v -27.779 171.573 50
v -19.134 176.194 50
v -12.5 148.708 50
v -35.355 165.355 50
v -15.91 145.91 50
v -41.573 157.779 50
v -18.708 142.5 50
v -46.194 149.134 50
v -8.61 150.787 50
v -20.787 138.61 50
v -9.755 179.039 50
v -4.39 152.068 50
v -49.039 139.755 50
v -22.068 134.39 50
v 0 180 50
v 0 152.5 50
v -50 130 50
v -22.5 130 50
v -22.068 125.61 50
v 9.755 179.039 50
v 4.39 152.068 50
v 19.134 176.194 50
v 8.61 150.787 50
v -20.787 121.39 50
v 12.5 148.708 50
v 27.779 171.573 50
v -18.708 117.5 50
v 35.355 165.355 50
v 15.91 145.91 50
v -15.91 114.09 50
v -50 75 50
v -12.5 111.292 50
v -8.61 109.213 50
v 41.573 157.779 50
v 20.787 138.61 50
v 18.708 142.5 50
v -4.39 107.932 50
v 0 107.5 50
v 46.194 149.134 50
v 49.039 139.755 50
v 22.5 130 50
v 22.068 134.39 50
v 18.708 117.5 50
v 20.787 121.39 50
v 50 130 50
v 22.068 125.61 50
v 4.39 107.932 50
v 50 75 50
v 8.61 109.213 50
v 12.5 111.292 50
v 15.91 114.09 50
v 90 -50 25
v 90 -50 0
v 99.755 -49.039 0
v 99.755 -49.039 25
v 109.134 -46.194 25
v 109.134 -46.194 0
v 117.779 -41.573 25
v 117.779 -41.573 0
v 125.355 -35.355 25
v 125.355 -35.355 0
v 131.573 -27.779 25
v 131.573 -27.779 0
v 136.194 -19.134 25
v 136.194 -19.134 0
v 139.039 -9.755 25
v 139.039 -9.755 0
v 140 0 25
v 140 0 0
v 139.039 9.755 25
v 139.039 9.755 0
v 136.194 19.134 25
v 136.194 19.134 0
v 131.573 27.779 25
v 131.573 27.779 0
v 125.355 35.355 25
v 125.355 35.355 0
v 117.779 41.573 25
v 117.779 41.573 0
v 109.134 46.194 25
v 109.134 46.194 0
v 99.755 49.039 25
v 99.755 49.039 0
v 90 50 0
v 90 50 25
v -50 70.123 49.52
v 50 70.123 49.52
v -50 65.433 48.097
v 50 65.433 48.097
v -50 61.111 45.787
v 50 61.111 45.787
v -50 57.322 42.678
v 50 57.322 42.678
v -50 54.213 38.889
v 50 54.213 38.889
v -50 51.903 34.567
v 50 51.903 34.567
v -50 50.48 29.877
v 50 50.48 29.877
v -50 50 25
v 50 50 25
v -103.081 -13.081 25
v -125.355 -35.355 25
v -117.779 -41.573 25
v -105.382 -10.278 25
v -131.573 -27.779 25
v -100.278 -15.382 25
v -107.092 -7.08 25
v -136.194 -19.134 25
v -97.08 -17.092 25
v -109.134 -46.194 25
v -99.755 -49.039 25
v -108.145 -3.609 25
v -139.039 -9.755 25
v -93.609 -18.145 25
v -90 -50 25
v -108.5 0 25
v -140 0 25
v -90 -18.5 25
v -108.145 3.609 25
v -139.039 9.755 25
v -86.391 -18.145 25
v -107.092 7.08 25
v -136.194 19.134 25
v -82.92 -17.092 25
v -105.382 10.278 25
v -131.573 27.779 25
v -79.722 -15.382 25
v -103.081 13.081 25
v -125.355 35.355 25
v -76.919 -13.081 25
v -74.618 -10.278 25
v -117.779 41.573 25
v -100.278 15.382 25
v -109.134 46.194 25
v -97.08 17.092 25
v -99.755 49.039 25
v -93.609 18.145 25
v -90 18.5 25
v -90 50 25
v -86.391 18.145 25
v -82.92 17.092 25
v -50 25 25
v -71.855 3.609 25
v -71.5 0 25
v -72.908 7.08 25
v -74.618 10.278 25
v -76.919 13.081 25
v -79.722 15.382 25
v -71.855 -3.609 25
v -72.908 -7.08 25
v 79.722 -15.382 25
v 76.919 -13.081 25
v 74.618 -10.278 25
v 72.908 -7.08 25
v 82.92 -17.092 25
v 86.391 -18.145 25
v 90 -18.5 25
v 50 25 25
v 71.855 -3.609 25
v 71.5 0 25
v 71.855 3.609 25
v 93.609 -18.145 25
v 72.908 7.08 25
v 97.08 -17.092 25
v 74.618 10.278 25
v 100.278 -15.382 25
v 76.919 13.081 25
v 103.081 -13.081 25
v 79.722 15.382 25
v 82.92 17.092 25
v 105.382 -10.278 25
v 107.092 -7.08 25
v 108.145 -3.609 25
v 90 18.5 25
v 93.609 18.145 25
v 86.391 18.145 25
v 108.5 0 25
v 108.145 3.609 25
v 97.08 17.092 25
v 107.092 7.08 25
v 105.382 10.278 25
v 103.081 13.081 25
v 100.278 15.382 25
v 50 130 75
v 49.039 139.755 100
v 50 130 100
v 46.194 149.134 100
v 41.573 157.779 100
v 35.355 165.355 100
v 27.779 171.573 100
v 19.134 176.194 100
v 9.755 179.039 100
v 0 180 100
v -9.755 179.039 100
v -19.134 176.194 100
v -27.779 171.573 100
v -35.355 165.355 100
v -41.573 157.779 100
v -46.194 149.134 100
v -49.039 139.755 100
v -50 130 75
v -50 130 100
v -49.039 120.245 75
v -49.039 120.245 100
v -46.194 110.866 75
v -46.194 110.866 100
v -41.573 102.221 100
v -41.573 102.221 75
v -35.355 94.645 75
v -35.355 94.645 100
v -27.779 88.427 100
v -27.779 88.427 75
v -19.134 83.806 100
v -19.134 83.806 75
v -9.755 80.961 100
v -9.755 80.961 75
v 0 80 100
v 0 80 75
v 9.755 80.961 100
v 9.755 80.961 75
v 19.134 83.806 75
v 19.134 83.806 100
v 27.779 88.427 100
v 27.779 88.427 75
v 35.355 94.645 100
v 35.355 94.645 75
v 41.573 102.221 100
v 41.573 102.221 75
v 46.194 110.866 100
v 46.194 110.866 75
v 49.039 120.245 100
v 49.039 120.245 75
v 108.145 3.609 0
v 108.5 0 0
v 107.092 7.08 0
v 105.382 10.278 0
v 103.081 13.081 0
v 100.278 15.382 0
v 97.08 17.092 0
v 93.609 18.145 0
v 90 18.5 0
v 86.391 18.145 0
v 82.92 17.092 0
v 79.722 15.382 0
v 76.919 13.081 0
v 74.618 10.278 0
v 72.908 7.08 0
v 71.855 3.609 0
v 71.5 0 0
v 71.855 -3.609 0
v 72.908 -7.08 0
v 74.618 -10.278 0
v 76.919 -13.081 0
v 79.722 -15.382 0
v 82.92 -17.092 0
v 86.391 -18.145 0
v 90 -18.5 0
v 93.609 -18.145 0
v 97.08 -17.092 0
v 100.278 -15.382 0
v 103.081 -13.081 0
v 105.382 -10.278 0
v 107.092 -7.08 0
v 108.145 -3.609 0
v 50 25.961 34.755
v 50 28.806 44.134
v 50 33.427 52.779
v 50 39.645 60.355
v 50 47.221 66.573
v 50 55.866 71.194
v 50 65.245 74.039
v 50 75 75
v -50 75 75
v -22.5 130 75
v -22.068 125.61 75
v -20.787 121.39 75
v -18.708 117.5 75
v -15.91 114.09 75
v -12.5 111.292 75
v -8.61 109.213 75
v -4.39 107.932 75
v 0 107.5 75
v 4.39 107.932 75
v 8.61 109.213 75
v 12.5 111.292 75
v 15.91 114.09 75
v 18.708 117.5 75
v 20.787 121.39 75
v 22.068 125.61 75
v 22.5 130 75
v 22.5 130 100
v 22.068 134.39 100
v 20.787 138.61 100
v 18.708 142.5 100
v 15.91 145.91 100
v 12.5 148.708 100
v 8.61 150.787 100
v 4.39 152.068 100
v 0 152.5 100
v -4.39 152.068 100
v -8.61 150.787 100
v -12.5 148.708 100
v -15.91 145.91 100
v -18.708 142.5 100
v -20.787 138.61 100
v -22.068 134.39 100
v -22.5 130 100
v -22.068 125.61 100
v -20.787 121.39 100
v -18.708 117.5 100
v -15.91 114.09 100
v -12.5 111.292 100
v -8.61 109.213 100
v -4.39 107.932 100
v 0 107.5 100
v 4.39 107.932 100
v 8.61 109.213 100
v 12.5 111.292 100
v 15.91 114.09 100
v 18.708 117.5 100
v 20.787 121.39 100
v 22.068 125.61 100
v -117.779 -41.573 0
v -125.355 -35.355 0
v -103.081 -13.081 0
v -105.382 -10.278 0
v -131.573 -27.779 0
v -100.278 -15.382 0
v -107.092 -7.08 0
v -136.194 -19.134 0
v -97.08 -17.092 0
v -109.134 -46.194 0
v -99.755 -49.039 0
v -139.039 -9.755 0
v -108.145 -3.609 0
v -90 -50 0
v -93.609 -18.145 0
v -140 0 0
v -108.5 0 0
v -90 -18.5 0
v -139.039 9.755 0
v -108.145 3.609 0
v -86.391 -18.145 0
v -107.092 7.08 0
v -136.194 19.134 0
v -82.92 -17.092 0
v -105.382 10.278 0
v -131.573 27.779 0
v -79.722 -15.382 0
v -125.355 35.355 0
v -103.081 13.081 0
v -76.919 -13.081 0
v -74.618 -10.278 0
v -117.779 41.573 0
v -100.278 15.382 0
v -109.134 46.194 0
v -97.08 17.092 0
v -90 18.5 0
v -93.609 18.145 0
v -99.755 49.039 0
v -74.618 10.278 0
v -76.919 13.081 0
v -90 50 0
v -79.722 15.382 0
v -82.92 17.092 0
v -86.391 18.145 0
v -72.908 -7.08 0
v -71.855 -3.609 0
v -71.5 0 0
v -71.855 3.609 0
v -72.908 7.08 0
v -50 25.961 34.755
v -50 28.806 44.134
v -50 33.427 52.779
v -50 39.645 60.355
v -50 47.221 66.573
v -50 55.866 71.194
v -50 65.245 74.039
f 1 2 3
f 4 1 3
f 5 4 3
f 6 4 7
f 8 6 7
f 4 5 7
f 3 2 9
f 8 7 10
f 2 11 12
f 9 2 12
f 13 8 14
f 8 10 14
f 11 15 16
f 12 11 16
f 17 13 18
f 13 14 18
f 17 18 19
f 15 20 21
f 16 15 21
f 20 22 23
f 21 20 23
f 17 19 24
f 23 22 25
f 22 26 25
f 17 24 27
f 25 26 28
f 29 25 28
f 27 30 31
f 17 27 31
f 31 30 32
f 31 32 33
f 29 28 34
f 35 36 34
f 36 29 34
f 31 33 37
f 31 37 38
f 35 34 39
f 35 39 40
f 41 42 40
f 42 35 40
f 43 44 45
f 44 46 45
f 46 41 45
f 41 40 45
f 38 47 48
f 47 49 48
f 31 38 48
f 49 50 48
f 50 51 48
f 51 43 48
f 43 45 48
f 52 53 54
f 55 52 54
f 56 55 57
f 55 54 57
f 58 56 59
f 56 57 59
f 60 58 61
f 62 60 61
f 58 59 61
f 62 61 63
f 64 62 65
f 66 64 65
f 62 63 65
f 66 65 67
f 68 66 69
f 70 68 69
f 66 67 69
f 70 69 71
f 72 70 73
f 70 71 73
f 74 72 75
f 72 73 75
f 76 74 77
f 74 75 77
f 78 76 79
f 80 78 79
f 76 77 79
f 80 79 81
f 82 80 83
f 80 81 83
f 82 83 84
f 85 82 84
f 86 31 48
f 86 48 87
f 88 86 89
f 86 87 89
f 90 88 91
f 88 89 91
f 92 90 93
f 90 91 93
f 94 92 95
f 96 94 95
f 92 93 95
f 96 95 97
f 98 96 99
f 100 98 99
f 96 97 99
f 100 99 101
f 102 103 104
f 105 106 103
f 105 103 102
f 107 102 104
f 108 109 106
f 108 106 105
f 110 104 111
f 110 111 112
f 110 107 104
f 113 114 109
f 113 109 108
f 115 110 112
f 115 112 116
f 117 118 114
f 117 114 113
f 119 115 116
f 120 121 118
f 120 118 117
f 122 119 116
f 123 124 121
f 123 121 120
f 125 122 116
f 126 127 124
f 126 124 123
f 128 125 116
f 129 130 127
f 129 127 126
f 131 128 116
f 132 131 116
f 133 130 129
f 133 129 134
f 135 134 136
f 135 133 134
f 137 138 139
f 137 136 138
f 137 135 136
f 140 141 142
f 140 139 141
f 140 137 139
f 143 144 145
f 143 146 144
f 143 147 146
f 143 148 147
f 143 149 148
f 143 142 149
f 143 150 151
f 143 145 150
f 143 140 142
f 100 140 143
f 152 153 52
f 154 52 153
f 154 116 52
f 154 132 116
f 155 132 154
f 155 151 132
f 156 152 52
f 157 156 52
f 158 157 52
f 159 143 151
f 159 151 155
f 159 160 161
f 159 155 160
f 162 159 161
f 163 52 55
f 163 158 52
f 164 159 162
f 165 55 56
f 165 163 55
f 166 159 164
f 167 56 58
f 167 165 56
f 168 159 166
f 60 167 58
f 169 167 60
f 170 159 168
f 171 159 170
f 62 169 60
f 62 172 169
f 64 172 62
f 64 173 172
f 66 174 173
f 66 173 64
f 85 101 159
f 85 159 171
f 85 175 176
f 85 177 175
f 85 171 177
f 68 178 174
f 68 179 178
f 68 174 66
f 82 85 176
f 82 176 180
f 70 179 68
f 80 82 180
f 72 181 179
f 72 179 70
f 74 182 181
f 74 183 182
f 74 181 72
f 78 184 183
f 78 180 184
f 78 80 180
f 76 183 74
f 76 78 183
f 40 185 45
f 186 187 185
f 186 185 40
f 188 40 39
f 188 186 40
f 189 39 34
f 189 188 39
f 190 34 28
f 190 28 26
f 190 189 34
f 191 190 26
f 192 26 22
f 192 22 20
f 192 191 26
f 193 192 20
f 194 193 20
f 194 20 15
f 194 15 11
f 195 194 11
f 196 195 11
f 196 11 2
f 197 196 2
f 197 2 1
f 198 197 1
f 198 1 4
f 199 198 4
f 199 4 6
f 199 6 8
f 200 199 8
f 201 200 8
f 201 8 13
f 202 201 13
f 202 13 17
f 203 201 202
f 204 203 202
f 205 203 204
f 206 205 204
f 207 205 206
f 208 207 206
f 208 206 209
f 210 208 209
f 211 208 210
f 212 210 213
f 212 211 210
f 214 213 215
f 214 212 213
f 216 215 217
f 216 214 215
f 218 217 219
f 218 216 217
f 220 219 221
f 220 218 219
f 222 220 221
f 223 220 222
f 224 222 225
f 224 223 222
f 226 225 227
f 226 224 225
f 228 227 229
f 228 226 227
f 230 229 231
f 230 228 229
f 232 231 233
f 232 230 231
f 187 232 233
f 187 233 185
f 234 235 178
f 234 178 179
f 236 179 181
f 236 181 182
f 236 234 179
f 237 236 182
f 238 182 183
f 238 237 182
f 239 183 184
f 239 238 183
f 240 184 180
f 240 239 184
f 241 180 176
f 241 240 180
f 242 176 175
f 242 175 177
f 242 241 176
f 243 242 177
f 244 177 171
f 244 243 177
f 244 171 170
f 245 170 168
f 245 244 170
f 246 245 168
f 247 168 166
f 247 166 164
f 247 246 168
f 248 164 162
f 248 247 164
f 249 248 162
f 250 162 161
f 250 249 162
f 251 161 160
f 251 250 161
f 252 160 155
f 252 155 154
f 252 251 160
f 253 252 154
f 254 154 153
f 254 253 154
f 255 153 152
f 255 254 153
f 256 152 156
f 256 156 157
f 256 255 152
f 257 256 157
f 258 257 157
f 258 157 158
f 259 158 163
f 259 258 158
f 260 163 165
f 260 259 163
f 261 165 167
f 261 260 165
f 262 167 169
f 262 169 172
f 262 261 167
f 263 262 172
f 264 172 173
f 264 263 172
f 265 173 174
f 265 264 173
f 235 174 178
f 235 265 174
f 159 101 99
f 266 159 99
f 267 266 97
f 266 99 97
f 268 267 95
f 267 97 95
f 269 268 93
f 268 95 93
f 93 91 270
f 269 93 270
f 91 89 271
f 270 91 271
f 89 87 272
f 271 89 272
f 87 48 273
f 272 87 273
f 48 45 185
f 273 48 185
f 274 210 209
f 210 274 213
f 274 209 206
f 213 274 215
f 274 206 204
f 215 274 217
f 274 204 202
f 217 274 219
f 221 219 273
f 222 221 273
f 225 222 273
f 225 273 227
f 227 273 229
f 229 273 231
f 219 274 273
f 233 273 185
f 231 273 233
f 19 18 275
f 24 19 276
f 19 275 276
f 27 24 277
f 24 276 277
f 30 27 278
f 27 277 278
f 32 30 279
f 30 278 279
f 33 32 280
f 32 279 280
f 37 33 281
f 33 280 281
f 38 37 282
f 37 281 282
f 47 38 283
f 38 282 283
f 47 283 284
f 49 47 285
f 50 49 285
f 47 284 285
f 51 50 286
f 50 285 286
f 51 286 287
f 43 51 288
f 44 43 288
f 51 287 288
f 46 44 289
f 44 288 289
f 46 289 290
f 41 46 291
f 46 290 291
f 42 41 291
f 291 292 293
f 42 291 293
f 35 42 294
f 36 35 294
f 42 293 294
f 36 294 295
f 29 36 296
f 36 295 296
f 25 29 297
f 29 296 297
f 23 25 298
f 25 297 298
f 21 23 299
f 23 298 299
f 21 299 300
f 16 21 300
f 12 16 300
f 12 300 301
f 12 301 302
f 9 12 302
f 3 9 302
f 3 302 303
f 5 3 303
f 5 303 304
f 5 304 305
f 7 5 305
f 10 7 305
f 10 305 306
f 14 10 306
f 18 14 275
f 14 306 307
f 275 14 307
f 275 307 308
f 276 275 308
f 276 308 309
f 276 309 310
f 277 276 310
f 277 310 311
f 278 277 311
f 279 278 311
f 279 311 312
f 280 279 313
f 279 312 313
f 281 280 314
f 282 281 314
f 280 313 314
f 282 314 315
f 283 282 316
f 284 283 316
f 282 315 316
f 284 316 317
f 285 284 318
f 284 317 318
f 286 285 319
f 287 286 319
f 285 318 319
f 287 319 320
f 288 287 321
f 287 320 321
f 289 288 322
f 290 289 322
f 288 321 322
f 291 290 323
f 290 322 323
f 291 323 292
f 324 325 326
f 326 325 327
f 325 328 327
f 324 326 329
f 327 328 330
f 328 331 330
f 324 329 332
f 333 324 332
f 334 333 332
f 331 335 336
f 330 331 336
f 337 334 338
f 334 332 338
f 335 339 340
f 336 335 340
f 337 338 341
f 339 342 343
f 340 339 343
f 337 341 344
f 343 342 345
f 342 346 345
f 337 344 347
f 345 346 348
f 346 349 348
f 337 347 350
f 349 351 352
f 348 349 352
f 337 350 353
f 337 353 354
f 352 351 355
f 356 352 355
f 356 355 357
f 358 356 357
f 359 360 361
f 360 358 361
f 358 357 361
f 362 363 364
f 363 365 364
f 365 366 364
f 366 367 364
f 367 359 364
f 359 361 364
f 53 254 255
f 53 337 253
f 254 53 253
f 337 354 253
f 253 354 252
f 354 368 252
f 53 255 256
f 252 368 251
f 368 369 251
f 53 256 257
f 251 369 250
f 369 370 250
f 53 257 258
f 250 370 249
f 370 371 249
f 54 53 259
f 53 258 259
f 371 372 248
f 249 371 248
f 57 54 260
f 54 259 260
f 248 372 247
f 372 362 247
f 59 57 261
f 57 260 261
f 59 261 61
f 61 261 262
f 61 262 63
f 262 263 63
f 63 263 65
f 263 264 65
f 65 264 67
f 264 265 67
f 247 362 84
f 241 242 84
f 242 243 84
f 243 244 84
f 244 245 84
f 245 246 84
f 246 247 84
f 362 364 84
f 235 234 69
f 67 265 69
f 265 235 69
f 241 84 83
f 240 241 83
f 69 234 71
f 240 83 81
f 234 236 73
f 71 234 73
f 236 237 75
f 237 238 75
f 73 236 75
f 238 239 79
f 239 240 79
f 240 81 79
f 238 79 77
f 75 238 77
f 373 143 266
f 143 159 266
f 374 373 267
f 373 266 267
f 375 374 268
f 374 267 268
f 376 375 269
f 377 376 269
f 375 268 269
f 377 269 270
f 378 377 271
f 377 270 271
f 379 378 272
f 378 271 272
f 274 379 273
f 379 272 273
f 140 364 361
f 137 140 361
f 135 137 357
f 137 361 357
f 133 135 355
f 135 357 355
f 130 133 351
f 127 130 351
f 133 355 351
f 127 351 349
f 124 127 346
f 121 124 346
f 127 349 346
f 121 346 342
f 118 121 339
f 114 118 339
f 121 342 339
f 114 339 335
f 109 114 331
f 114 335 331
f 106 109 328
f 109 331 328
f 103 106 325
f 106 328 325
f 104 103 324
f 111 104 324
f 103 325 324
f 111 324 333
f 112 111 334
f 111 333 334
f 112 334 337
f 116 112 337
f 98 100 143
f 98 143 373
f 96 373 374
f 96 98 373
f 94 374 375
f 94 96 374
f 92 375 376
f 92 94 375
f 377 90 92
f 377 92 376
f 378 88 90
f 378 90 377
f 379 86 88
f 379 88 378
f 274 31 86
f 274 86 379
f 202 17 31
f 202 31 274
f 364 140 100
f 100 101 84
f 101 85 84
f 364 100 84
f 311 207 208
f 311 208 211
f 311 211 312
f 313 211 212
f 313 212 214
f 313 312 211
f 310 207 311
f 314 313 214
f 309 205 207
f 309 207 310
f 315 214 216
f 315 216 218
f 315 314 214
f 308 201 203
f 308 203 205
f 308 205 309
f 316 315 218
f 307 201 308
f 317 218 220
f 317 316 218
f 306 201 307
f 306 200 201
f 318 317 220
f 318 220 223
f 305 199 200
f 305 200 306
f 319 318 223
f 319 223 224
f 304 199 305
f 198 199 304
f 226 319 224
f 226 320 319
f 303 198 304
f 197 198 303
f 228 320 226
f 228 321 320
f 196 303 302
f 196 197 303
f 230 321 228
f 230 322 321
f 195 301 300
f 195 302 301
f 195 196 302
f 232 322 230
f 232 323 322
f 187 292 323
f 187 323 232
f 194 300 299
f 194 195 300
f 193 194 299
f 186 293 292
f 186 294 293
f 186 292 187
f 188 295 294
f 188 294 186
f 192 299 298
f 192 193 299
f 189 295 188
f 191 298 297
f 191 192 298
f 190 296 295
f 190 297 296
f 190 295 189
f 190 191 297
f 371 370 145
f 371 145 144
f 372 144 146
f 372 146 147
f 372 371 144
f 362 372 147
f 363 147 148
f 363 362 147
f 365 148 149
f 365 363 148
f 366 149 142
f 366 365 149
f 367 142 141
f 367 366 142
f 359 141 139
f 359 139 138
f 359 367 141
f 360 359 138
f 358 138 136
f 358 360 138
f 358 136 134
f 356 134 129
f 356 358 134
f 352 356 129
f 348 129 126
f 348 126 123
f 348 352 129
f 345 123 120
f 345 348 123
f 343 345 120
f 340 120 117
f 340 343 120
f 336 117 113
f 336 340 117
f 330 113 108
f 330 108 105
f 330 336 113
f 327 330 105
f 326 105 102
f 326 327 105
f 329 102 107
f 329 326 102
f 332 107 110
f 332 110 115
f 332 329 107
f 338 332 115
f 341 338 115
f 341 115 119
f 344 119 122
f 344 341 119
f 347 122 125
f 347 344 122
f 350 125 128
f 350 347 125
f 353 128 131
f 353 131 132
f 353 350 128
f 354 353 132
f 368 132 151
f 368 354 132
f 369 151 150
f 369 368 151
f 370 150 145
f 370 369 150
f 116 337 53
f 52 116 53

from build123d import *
from build123d.topology import SkipClean

# Parameters (mm, degrees)
SKETCH1_R           = 18.5
BOSS_EXTRUDE1_DEPTH = 25
BOSS_EXTRUDE2_START = 100
SKETCH1_3_R         = 50
SKETCH1_3_R_2       = 22.5
BOSS_EXTRUDE2_DEPTH = 50
BOSS_EXTRUDE3_DEPTH = 50
CUT_EXTRUDE1_DEPTH  = 241.052077683


with BuildPart() as part:
    # Sketch1 → Boss-Extrude1 (new body)
    with BuildSketch(Plane.XY):
        with BuildLine():
            Line((-90, -50), (90, -50))
            ThreePointArc((90, -50), (140, 0), (90, 50))
            Line((90, 50), (-90, 50))
            ThreePointArc((-90, 50), (-140, 0), (-90, -50))
        make_face()
        with Locations((-90, 0)):
            Circle(SKETCH1_R, mode=Mode.SUBTRACT)
        with Locations((90, 0)):
            Circle(SKETCH1_R, mode=Mode.SUBTRACT)
    extrude(amount=BOSS_EXTRUDE1_DEPTH)



with BuildPart() as body_2:
    # Sketch1<3> → Boss-Extrude2 (new body)
    with BuildSketch(Plane.XY.offset(BOSS_EXTRUDE2_START)):
        with Locations((0, 130)):
            Circle(SKETCH1_3_R)
        with Locations((0, 130)):
            Circle(SKETCH1_3_R_2, mode=Mode.SUBTRACT)
    extrude(amount=-BOSS_EXTRUDE2_DEPTH)


with BuildPart() as part_1:
    add(part.part)

    add(body_2.part)  # Boss-Extrude3 merges body 2
    # Sketch2 → Boss-Extrude3 (add, symmetric)
    with BuildSketch(Plane(origin=(0, 0, 0), x_dir=(0, 0, -1), z_dir=(1, 0, 0))):
        with BuildLine():
            Line((-50, 130), (-50, 75))
            ThreePointArc((-50, 75), (-42.67766953, 57.32233047), (-25, 50))
            Line((-25, 50), (-12.5, 50))
            Line((-12.5, 50), (-12.5, 25))
            Line((-12.5, 25), (-25, 25))
            ThreePointArc((-25, 25), (-60.355339059, 39.644660941), (-75, 75))
            Line((-75, 75), (-75, 130))
            Line((-75, 130), (-50, 130))
        make_face()
    extrude(amount=BOSS_EXTRUDE3_DEPTH, both=True)

    # Sketch3 → Cut-Extrude1 (cut, through all)
    with SkipClean():  # the faces are left unmerged after this step: merging them gives an invalid solid
        with BuildSketch(Plane.XY.offset(75)):
            with BuildLine():
                Line((22.5, 130), (-22.5, 130))
                ThreePointArc((-22.5, 130), (0, 107.5), (22.5, 130))
            make_face()
        extrude(amount=-CUT_EXTRUDE1_DEPTH, mode=Mode.SUBTRACT)
    add(part_1.part.scale(1), mode=Mode.REPLACE)  # the faces are merged on a copy


solid = part_1.part
